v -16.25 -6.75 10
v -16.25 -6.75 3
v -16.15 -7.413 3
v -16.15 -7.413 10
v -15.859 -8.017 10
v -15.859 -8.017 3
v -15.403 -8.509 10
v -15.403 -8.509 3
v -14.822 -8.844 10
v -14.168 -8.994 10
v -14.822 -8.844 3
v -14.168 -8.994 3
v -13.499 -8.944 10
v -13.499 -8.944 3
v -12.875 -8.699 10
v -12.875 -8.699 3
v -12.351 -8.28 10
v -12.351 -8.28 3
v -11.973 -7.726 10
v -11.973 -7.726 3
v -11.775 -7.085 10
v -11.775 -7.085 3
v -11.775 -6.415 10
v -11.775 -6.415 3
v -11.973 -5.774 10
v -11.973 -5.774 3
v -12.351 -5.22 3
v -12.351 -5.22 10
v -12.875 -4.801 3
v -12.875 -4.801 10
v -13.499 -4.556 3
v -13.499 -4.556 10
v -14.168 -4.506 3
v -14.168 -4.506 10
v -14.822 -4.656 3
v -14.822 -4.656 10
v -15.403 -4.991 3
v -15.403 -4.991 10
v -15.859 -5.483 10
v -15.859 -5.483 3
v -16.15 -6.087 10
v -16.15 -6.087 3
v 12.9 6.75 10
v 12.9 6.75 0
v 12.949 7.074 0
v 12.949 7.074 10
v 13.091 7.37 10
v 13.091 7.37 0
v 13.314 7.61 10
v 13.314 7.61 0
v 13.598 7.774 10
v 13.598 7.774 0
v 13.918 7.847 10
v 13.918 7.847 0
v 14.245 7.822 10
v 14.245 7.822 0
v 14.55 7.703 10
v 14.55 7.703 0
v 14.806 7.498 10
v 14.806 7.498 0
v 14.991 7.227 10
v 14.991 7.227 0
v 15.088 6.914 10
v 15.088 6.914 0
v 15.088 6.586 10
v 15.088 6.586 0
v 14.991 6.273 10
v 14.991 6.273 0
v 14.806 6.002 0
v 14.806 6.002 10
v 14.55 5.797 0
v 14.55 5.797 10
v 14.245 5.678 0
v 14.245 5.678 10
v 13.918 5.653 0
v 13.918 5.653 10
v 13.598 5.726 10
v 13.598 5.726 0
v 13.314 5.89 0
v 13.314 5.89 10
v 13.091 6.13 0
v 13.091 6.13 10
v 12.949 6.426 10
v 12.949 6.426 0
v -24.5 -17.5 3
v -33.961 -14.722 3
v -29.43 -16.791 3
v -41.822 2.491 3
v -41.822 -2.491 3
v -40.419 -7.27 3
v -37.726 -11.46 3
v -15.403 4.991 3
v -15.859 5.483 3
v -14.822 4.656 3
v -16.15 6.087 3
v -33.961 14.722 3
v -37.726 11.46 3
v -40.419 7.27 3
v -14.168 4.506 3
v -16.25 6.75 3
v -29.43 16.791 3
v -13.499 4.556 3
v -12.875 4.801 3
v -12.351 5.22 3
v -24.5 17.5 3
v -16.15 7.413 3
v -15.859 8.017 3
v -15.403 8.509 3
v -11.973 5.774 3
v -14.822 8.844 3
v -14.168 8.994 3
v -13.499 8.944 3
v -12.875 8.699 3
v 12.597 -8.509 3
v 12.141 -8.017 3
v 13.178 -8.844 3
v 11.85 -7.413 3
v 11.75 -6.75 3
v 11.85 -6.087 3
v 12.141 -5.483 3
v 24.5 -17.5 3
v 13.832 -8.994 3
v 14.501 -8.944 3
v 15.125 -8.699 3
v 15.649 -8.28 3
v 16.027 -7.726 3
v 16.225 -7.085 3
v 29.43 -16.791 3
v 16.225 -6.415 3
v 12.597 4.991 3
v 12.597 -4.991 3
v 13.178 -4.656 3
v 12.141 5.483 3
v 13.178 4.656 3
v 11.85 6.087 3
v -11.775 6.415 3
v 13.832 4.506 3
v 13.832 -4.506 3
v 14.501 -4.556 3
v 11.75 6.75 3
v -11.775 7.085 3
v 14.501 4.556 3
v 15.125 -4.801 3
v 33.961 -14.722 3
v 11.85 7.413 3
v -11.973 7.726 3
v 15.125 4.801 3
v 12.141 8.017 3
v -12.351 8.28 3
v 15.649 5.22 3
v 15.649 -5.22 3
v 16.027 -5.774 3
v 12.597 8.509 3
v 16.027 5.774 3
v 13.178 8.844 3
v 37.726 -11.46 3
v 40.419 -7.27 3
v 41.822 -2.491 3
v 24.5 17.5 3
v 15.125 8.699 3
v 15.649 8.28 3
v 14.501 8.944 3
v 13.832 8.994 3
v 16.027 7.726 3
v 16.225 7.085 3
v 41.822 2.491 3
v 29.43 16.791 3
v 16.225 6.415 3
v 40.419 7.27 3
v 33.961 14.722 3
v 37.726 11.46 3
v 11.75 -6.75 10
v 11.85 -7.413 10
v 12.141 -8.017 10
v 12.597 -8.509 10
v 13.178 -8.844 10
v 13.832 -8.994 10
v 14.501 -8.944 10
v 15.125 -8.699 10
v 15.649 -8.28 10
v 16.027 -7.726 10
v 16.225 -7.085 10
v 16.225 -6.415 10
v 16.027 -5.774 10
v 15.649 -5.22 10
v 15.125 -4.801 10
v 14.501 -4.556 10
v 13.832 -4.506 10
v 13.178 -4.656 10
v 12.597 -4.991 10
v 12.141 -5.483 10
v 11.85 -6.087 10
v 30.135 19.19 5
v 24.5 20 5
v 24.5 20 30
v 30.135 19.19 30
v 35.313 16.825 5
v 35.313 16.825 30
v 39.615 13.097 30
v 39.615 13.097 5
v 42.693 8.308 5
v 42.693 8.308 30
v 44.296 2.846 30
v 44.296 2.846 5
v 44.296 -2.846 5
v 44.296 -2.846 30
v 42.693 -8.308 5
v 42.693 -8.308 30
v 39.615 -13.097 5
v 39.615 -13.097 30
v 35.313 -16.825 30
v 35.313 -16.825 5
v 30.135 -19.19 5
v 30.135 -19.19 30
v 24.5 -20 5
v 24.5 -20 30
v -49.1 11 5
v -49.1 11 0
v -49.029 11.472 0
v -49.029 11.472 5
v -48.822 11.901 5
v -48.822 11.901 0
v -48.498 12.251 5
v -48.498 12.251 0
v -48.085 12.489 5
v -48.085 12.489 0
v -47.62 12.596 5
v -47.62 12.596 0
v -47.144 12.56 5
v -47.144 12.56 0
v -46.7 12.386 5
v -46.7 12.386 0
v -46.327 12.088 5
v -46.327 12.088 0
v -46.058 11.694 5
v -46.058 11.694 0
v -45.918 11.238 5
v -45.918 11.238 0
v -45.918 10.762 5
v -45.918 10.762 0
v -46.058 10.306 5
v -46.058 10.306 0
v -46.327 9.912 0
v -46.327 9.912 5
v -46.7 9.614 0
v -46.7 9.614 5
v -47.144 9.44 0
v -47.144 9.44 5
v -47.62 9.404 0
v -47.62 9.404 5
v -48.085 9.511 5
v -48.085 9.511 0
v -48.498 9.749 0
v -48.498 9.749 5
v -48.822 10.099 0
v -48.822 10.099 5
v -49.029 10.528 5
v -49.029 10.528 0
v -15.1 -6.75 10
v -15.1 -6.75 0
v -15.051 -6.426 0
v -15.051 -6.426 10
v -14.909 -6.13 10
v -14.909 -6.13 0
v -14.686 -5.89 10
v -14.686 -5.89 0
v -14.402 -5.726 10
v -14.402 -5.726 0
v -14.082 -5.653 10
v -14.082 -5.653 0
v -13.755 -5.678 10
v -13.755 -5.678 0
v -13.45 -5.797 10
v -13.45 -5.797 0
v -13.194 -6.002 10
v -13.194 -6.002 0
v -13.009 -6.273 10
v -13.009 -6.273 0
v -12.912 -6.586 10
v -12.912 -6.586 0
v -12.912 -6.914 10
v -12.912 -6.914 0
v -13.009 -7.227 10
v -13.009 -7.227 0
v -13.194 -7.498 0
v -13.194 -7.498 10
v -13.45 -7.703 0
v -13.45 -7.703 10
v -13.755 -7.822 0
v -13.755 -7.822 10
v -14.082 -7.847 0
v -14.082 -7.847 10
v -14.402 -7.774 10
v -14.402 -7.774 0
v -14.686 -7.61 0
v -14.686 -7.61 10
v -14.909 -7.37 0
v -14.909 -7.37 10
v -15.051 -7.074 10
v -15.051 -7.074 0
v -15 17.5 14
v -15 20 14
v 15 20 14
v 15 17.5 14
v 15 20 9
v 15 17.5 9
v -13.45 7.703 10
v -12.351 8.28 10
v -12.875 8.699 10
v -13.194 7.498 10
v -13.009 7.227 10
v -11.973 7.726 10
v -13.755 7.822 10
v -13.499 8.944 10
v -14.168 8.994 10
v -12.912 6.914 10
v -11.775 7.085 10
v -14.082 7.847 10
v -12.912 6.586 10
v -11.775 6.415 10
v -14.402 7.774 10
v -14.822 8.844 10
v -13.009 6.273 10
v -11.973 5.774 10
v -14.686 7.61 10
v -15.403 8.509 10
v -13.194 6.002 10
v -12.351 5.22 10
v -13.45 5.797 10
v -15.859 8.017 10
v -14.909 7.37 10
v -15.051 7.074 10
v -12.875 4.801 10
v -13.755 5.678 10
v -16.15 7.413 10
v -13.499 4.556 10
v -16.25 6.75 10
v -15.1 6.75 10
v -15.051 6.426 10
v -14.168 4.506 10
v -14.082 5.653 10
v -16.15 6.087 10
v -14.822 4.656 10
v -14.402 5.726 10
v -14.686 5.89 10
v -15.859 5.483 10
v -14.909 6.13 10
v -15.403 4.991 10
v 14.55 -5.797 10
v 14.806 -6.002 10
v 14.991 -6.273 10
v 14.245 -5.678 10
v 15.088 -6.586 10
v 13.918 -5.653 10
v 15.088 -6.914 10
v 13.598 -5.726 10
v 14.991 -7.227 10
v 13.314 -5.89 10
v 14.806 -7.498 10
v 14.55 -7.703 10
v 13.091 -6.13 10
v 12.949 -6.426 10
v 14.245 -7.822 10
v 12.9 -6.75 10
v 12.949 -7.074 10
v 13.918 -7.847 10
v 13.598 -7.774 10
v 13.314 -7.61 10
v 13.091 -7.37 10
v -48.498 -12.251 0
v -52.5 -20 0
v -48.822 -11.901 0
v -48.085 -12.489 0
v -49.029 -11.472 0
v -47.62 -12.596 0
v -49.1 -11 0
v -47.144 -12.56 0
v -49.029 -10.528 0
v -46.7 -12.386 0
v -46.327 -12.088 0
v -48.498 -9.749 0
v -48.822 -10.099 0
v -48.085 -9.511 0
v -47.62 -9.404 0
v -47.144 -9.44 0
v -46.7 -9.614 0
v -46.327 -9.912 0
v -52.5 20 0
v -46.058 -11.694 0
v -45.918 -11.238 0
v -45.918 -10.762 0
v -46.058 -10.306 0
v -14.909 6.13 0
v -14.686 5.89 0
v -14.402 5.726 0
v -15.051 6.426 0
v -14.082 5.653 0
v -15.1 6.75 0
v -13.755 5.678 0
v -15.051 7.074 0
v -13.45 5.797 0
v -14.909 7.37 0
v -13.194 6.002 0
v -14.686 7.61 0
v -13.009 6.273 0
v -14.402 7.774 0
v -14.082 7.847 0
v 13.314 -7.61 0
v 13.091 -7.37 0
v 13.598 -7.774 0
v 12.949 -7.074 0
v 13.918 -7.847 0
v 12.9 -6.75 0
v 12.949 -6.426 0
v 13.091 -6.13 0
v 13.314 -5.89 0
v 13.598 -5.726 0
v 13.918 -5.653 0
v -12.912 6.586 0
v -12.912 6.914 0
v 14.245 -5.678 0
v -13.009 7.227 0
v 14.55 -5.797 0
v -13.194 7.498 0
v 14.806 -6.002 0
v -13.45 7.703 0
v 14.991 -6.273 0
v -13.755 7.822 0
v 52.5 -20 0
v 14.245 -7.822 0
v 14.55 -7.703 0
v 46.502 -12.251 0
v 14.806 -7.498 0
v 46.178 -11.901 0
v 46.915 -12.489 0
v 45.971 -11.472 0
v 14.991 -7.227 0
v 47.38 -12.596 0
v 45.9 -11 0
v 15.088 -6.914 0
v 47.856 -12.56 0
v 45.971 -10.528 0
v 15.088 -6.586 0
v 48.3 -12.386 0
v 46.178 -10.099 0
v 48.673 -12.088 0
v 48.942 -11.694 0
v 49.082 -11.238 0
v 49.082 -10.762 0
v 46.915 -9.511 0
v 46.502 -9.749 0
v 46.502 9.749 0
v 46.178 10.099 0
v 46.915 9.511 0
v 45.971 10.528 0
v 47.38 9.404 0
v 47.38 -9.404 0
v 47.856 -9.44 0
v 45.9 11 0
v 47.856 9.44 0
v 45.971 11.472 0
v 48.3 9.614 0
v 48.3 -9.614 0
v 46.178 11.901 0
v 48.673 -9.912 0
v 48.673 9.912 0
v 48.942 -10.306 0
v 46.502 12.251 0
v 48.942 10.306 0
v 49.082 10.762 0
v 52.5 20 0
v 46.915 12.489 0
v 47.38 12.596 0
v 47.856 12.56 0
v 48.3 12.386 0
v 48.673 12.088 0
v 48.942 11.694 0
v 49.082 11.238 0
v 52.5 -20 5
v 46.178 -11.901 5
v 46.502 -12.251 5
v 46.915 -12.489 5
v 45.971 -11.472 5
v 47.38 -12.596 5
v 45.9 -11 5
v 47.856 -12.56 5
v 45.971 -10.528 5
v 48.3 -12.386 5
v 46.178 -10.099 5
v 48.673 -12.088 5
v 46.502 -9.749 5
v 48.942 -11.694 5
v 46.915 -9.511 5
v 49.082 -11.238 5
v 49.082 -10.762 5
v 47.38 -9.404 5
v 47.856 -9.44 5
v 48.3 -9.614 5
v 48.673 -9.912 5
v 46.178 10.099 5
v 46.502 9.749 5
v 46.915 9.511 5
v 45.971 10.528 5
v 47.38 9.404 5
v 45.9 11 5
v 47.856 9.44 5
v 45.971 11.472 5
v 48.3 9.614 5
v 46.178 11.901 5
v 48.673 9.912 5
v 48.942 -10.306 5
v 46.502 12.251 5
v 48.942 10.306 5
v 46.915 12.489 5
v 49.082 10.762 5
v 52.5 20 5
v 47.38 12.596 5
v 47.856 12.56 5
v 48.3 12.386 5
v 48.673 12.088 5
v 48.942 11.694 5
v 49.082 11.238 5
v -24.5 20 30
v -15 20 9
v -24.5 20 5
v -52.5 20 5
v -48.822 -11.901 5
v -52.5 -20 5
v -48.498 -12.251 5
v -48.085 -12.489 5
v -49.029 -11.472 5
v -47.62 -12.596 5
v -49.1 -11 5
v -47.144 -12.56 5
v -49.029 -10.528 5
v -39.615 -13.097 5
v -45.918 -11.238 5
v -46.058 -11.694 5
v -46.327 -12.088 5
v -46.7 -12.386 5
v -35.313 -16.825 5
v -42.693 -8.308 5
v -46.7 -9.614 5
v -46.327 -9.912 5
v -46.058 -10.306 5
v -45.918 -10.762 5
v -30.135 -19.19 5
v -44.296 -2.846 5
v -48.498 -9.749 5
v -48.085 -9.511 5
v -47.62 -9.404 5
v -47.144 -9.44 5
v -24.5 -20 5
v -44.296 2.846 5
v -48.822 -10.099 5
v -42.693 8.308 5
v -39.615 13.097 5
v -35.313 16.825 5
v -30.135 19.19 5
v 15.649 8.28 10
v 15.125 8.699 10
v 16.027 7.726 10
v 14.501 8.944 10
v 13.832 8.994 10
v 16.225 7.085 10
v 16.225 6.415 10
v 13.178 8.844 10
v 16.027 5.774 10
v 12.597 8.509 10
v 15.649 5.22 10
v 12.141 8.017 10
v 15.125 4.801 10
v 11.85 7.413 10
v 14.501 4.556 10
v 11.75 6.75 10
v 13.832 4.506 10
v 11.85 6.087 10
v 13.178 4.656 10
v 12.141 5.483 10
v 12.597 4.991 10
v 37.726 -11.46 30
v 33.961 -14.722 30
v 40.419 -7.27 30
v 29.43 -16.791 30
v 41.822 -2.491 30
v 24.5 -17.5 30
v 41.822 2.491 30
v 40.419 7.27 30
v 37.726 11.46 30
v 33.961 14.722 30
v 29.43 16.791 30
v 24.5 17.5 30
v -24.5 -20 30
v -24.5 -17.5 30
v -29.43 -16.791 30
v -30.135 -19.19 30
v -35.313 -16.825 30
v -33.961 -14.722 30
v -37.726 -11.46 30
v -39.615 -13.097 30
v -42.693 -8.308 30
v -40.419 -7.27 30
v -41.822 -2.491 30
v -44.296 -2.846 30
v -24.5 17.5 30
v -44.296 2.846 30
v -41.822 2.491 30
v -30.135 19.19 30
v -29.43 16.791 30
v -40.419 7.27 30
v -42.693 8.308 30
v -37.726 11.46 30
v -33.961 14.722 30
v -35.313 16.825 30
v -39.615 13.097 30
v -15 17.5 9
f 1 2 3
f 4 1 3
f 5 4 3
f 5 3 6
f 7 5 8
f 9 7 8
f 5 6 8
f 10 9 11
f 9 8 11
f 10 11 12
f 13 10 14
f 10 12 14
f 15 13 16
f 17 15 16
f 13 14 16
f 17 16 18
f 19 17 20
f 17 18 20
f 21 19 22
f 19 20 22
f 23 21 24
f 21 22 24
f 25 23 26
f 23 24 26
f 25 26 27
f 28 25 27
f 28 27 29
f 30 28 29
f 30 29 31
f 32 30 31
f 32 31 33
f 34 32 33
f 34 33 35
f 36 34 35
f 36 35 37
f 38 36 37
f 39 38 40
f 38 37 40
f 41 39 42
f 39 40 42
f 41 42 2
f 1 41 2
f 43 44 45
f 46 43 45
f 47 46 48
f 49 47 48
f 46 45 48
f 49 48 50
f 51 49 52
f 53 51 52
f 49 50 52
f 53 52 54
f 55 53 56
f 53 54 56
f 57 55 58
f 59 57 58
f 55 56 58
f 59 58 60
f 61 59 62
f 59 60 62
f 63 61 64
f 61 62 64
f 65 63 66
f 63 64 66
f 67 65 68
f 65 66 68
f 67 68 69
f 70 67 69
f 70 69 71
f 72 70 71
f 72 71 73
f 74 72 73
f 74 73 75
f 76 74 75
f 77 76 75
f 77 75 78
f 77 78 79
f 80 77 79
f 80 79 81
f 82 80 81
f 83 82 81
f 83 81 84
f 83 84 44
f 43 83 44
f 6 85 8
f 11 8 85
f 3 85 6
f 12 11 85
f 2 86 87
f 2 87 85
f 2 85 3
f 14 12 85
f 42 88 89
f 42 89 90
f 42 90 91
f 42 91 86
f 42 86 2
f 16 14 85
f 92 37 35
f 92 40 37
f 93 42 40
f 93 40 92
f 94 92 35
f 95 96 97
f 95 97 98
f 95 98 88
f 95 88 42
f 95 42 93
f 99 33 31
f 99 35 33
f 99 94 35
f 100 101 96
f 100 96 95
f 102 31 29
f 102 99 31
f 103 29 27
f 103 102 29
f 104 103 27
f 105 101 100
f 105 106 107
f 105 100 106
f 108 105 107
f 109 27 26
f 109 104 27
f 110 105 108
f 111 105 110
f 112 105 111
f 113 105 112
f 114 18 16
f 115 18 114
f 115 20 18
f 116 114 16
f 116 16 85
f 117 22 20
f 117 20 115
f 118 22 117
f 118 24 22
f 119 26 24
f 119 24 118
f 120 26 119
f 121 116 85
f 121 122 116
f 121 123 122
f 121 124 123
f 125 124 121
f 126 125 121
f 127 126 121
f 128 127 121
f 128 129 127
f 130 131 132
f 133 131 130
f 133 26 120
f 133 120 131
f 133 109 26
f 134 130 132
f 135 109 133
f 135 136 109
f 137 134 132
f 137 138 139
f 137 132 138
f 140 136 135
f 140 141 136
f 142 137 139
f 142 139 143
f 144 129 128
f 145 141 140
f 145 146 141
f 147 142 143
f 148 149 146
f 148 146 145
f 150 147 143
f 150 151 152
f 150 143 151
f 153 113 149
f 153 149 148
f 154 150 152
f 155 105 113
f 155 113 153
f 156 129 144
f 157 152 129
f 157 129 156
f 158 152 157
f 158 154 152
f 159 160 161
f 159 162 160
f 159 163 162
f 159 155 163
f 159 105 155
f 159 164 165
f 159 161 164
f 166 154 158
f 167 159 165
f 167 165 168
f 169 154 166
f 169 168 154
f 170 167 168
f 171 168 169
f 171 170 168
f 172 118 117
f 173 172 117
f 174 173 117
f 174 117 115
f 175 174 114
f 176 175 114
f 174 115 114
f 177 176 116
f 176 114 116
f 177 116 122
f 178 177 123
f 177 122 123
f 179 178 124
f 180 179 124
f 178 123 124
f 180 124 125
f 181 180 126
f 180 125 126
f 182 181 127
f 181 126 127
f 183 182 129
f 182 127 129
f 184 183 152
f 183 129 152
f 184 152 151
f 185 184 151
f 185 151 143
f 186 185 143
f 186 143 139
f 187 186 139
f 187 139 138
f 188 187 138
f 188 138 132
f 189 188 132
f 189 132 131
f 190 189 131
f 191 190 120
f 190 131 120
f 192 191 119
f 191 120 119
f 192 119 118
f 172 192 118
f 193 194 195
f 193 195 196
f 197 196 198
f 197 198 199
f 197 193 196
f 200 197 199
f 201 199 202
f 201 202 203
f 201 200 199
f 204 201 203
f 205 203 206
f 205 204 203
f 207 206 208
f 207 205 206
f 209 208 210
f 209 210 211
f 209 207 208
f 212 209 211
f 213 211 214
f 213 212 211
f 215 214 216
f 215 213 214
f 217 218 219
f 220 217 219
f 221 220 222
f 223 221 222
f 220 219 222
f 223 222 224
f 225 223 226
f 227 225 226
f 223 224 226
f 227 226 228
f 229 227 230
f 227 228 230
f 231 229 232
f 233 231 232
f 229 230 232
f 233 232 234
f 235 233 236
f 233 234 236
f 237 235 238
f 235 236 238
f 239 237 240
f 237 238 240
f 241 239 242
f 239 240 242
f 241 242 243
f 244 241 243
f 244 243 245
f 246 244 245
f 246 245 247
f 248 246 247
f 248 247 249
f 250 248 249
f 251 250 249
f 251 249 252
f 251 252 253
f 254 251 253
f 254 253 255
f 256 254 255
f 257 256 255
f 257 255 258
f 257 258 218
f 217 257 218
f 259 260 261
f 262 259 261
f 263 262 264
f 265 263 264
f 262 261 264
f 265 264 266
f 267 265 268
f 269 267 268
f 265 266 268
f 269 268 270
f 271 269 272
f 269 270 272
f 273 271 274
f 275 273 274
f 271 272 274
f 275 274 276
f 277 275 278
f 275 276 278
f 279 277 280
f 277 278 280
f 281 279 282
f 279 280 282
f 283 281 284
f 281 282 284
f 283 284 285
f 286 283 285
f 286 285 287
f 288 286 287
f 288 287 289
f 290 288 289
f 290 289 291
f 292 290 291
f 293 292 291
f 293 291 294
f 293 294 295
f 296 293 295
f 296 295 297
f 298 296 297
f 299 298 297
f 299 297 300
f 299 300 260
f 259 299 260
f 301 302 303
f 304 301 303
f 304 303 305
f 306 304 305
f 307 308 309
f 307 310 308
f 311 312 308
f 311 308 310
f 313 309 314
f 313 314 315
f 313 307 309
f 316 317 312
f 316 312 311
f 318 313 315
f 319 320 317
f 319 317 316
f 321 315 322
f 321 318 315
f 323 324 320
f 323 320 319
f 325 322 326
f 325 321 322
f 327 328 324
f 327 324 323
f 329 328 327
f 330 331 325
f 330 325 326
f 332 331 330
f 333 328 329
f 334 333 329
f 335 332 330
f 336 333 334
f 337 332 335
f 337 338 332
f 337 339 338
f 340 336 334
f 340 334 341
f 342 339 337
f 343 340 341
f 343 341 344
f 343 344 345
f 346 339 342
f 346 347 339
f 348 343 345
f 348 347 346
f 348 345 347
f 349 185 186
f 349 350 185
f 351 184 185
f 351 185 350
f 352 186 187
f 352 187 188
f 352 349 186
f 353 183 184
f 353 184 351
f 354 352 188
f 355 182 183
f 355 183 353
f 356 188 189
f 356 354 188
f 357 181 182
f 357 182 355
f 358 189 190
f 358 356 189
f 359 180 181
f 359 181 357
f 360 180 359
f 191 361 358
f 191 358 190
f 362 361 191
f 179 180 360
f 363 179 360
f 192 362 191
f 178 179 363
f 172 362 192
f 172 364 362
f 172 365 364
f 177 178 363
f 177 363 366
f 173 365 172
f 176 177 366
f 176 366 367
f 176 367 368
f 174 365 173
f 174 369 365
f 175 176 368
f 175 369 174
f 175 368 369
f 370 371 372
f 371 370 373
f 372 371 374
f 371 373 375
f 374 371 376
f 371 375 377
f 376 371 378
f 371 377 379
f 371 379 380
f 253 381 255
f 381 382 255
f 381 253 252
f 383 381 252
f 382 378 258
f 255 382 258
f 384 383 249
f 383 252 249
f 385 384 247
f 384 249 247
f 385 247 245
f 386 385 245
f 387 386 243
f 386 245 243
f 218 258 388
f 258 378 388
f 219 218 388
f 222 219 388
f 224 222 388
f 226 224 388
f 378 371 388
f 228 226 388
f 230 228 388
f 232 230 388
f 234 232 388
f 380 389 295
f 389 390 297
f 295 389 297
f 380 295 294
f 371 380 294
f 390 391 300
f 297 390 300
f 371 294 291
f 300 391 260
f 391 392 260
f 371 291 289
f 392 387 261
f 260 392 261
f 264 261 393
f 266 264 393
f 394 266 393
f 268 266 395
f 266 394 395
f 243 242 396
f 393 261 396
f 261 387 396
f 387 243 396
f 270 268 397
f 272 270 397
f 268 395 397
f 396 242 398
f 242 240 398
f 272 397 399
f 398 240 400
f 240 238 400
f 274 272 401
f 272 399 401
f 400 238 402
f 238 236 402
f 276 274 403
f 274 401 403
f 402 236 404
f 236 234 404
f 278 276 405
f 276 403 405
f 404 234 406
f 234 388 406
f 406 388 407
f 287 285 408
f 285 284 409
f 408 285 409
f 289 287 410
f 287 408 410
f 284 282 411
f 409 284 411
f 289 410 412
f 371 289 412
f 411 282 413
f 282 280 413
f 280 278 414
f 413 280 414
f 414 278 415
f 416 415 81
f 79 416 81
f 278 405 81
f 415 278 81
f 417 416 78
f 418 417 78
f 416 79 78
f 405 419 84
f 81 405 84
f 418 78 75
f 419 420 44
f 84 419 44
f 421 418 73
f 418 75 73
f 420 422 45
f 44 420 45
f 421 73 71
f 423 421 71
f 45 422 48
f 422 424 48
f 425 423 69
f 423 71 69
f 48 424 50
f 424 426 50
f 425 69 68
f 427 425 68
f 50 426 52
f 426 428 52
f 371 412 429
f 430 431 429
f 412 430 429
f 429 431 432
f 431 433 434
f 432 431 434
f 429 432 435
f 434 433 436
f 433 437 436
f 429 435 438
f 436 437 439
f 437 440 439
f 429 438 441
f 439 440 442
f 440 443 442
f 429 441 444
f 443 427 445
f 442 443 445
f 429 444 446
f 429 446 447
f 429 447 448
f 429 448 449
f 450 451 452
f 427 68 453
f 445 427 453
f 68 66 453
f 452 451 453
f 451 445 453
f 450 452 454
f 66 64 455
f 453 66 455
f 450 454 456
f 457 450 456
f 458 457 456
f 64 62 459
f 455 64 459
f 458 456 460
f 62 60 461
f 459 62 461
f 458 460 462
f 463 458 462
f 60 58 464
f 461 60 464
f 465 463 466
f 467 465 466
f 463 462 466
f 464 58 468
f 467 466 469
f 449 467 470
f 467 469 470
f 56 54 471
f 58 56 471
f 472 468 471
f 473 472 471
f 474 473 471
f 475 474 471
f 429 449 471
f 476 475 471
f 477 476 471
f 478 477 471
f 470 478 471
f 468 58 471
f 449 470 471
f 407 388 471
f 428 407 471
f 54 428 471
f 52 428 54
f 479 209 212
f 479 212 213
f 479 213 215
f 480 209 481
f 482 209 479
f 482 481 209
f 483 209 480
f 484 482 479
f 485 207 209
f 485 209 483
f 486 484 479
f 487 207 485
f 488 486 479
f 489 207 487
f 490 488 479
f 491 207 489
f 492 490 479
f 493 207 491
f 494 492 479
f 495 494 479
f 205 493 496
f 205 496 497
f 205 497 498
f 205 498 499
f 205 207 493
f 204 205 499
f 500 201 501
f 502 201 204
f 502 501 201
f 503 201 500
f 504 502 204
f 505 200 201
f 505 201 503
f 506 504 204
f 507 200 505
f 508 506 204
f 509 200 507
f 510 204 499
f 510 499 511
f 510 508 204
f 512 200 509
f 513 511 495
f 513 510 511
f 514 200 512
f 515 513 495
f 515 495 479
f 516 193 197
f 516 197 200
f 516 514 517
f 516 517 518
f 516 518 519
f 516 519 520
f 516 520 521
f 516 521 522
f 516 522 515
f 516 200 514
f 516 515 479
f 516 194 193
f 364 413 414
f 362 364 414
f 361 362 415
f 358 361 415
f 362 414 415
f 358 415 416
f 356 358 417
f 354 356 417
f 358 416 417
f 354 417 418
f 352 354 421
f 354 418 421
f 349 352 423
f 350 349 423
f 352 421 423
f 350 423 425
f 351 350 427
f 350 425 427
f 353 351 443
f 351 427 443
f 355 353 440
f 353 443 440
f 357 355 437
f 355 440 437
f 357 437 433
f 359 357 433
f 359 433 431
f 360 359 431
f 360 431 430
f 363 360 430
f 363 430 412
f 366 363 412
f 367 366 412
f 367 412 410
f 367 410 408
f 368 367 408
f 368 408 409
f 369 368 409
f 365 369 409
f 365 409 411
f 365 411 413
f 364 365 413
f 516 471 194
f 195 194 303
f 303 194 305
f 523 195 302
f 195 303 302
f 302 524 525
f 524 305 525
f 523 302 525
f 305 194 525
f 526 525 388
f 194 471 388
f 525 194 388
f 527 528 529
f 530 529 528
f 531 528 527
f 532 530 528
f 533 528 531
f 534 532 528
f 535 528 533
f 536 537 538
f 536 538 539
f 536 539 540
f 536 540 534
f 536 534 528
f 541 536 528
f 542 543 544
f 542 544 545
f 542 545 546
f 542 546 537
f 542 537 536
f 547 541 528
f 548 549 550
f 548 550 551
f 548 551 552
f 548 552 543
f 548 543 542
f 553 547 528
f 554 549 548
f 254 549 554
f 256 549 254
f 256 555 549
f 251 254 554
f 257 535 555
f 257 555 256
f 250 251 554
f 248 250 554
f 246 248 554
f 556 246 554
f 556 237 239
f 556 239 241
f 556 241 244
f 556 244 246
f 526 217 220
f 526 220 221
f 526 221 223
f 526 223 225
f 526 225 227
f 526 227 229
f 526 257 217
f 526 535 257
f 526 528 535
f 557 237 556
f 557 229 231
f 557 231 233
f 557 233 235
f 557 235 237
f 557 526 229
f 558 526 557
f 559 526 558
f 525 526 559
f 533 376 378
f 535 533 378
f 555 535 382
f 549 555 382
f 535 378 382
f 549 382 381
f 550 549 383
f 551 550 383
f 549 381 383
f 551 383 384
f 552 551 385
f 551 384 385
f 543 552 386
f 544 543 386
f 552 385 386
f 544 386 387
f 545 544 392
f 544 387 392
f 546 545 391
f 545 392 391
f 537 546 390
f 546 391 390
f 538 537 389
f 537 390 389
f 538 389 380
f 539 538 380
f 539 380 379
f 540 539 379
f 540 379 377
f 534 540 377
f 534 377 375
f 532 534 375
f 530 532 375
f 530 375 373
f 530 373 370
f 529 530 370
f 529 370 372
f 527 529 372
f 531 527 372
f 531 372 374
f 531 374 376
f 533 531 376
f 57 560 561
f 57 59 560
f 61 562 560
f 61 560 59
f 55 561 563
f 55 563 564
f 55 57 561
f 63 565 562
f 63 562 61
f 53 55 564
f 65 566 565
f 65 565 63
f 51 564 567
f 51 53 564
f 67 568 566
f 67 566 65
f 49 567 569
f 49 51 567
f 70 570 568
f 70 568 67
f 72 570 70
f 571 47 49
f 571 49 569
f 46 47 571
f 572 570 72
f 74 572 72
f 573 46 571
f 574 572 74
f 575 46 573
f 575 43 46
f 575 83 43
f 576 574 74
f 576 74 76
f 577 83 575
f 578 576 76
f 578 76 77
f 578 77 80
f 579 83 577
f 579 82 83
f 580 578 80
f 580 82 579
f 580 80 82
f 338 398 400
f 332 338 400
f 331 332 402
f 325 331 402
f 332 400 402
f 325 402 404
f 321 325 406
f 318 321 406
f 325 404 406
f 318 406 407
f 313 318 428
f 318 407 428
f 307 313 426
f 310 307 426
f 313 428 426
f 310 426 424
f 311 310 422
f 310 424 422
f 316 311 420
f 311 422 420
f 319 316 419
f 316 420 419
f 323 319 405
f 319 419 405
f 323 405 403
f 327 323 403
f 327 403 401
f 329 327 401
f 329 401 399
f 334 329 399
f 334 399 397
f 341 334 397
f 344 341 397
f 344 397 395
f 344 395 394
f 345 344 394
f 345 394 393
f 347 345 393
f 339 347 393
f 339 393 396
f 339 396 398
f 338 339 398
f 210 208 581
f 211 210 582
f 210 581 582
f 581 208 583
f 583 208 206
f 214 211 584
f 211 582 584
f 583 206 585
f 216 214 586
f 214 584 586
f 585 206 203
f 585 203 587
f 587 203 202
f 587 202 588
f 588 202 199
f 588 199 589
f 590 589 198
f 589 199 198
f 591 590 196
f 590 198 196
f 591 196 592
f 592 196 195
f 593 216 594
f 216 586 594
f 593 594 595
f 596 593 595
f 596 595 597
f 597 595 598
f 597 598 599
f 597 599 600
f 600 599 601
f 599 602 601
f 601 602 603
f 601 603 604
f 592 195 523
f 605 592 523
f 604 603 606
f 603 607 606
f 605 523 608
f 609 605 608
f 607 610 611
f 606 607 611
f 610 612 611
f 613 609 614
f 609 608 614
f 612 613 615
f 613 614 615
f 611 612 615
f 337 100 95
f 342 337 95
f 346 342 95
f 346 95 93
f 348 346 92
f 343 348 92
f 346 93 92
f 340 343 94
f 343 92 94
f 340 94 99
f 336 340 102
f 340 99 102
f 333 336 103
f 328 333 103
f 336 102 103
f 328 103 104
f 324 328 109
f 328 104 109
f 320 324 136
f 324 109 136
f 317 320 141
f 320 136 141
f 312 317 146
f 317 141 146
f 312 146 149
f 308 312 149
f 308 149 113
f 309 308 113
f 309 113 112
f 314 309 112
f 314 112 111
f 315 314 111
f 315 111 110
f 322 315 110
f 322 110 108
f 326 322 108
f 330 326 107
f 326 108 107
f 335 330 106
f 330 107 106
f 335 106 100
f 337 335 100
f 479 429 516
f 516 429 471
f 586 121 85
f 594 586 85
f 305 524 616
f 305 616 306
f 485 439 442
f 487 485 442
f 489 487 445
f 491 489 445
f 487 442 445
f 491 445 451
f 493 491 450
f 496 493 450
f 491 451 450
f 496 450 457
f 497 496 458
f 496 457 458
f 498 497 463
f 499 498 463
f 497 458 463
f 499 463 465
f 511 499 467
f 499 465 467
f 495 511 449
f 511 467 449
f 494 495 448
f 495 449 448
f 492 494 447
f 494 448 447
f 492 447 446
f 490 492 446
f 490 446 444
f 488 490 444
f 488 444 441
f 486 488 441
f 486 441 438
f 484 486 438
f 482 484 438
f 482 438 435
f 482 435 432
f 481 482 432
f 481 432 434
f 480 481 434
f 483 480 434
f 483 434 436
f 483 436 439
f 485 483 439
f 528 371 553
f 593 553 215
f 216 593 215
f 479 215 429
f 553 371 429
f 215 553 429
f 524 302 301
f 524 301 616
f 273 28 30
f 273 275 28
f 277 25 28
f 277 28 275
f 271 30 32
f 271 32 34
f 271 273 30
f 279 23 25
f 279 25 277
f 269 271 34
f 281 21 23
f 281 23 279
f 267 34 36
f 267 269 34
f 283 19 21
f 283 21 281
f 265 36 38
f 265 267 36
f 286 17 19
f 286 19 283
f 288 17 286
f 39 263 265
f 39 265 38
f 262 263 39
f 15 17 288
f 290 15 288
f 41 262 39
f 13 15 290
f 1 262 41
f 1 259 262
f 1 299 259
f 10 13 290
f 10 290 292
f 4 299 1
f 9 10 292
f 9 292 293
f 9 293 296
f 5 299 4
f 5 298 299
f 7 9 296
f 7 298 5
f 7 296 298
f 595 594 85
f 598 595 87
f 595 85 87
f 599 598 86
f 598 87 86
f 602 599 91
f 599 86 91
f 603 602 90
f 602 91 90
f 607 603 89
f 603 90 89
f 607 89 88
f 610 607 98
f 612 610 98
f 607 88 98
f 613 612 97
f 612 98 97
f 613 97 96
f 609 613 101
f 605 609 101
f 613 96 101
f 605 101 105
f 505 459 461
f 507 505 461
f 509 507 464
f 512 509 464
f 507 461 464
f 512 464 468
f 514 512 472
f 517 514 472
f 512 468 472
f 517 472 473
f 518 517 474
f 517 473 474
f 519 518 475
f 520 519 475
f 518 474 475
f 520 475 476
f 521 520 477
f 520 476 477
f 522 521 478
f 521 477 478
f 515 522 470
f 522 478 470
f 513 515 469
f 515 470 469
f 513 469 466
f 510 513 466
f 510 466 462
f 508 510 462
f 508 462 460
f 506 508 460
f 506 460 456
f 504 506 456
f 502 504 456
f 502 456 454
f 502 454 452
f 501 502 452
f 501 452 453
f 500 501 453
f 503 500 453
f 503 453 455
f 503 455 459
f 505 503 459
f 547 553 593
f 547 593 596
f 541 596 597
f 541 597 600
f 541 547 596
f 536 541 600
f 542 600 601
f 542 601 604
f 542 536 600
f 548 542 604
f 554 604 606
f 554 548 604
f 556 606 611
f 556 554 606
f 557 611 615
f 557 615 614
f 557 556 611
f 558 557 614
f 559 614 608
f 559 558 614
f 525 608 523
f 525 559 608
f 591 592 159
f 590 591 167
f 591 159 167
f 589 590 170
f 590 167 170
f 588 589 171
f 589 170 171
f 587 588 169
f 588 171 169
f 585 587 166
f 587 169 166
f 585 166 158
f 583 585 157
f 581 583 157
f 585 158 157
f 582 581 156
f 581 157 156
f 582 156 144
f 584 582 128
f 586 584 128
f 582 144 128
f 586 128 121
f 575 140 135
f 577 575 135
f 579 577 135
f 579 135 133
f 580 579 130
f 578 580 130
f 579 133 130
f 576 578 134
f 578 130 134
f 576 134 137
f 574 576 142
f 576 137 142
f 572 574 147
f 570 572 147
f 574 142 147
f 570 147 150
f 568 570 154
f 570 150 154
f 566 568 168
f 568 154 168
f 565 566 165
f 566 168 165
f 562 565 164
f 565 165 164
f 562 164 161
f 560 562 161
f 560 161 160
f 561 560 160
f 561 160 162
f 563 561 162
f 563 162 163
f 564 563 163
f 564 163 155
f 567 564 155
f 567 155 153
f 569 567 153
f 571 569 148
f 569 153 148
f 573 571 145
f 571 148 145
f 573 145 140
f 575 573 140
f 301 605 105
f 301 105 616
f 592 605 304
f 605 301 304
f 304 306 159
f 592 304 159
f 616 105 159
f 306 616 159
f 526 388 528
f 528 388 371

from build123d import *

# Parameters (mm, degrees)
EXTRUDE_1_DEPTH           = 30
SHELL_1_T                 = -2.5
SHELL_1_THICKNESS_2_DEPTH = 0.5
EXTRUDE_2_DEPTH           = 5
HOLE_WIZARD_M31_D         = 3.2
SKETCH_5_R                = 2.25
EXTRUDE_3_DEPTH           = 7
HOLE_WIZARD_M21_D         = 2.2
HOLE_WIZARD_M21_DEPTH     = 11.5
HOLE_WIZARD_M21_TIP       = 0.660946681
SKETCH_8_W                = 30
SKETCH_8_H                = 5
CUT_EXTRUDE_1_DEPTH       = 5


with BuildPart() as part:
    # Эскиз1 → Бобышка-Вытянуть1 (new body)
    with BuildSketch(Plane.XY):
        with BuildLine():
            Line((-24.5, 20), (24.5, 20))
            ThreePointArc((24.5, 20), (44.5, 0), (24.5, -20))
            Line((24.5, -20), (-24.5, -20))
            ThreePointArc((-24.5, -20), (-44.5, 0), (-24.5, 20))
        make_face()
    extrude(amount=EXTRUDE_1_DEPTH)

    # Оболочка1
    shell_1_openings = [part.faces().sort_by_distance(p)[0] for p in [
        (0, 0, 30),
    ]]
    offset(amount=SHELL_1_T, openings=shell_1_openings, kind=Kind.INTERSECTION)

    # Оболочка1 thickness 2 face (on inner face of the shell) → Оболочка1 thickness 2 (add)
    with BuildSketch(Plane(origin=(0, 0, 2.5), x_dir=(-1, 0, 0), z_dir=(0, 0, -1))):
        with BuildLine():
            Line((-24.5, 17.5), (24.5, 17.5))
            ThreePointArc((24.5, 17.5), (42, 0), (24.5, -17.5))
            Line((24.5, -17.5), (-24.5, -17.5))
            ThreePointArc((-24.5, -17.5), (-42, 0), (-24.5, 17.5))
        make_face()
    extrude(amount=-SHELL_1_THICKNESS_2_DEPTH)

    # Эскиз2 → Бобышка-Вытянуть2 (add)
    with BuildSketch(Plane.XY):
        with BuildLine():
            Line((-24.5, 20), (-52.5, 20))
            Line((-52.5, 20), (-52.5, -20))
            Line((-52.5, -20), (-24.5, -20))
            ThreePointArc((-24.5, -20), (-44.5, 0), (-24.5, 20))
        make_face()
        with BuildLine():
            Line((24.5, -20), (52.5, -20))
            Line((52.5, -20), (52.5, 20))
            Line((52.5, 20), (24.5, 20))
            ThreePointArc((24.5, 20), (44.5, 0), (24.5, -20))
        make_face()
    extrude(amount=EXTRUDE_2_DEPTH)

    # Отверстие с зазором M31 (through all)
    with Locations(Plane.XY.offset(30)):
        with Locations((-47.5, 11), (-47.5, -11), (47.5, -11), (47.5, 11)):
            Hole(HOLE_WIZARD_M31_D / 2)

    # Эскиз5 → Бобышка-Вытянуть3 (add)
    with BuildSketch(Plane.XY.offset(3)):
        with Locations(Location((-14, 6.75, 0), (0, 0, 180))):
            Circle(SKETCH_5_R)
        with Locations(Location((14, 6.75, 0), (0, 0, 180))):
            Circle(SKETCH_5_R)
        with Locations(Location((-14, -6.75, 0), (0, 0, 180))):
            Circle(SKETCH_5_R)
        with Locations(Location((14, -6.75, 0), (0, 0, 180))):
            Circle(SKETCH_5_R)
    extrude(amount=EXTRUDE_3_DEPTH)

    # Отверстие с зазором M21
    with Locations(Plane.XY.offset(10)):
        with Locations((-14, 6.75), (14, 6.75), (14, -6.75), (-14, -6.75)):
            Hole(HOLE_WIZARD_M21_D / 2, depth=HOLE_WIZARD_M21_DEPTH)
            with Locations((0, 0, -(HOLE_WIZARD_M21_DEPTH + HOLE_WIZARD_M21_TIP / 2))):  # 118° drill point
                Cone(0, HOLE_WIZARD_M21_D / 2, HOLE_WIZARD_M21_TIP, mode=Mode.SUBTRACT)

    # Эскиз8 → Вырез-Вытянуть1 (cut)
    with BuildSketch(Plane(origin=(0, 20, 0), x_dir=(1, 0, 0), z_dir=(0, 1, 0))):
        with Locations((0, -11.5)):
            Rectangle(SKETCH_8_W, SKETCH_8_H)
    extrude(amount=-CUT_EXTRUDE_1_DEPTH, mode=Mode.SUBTRACT)


solid = part.part
